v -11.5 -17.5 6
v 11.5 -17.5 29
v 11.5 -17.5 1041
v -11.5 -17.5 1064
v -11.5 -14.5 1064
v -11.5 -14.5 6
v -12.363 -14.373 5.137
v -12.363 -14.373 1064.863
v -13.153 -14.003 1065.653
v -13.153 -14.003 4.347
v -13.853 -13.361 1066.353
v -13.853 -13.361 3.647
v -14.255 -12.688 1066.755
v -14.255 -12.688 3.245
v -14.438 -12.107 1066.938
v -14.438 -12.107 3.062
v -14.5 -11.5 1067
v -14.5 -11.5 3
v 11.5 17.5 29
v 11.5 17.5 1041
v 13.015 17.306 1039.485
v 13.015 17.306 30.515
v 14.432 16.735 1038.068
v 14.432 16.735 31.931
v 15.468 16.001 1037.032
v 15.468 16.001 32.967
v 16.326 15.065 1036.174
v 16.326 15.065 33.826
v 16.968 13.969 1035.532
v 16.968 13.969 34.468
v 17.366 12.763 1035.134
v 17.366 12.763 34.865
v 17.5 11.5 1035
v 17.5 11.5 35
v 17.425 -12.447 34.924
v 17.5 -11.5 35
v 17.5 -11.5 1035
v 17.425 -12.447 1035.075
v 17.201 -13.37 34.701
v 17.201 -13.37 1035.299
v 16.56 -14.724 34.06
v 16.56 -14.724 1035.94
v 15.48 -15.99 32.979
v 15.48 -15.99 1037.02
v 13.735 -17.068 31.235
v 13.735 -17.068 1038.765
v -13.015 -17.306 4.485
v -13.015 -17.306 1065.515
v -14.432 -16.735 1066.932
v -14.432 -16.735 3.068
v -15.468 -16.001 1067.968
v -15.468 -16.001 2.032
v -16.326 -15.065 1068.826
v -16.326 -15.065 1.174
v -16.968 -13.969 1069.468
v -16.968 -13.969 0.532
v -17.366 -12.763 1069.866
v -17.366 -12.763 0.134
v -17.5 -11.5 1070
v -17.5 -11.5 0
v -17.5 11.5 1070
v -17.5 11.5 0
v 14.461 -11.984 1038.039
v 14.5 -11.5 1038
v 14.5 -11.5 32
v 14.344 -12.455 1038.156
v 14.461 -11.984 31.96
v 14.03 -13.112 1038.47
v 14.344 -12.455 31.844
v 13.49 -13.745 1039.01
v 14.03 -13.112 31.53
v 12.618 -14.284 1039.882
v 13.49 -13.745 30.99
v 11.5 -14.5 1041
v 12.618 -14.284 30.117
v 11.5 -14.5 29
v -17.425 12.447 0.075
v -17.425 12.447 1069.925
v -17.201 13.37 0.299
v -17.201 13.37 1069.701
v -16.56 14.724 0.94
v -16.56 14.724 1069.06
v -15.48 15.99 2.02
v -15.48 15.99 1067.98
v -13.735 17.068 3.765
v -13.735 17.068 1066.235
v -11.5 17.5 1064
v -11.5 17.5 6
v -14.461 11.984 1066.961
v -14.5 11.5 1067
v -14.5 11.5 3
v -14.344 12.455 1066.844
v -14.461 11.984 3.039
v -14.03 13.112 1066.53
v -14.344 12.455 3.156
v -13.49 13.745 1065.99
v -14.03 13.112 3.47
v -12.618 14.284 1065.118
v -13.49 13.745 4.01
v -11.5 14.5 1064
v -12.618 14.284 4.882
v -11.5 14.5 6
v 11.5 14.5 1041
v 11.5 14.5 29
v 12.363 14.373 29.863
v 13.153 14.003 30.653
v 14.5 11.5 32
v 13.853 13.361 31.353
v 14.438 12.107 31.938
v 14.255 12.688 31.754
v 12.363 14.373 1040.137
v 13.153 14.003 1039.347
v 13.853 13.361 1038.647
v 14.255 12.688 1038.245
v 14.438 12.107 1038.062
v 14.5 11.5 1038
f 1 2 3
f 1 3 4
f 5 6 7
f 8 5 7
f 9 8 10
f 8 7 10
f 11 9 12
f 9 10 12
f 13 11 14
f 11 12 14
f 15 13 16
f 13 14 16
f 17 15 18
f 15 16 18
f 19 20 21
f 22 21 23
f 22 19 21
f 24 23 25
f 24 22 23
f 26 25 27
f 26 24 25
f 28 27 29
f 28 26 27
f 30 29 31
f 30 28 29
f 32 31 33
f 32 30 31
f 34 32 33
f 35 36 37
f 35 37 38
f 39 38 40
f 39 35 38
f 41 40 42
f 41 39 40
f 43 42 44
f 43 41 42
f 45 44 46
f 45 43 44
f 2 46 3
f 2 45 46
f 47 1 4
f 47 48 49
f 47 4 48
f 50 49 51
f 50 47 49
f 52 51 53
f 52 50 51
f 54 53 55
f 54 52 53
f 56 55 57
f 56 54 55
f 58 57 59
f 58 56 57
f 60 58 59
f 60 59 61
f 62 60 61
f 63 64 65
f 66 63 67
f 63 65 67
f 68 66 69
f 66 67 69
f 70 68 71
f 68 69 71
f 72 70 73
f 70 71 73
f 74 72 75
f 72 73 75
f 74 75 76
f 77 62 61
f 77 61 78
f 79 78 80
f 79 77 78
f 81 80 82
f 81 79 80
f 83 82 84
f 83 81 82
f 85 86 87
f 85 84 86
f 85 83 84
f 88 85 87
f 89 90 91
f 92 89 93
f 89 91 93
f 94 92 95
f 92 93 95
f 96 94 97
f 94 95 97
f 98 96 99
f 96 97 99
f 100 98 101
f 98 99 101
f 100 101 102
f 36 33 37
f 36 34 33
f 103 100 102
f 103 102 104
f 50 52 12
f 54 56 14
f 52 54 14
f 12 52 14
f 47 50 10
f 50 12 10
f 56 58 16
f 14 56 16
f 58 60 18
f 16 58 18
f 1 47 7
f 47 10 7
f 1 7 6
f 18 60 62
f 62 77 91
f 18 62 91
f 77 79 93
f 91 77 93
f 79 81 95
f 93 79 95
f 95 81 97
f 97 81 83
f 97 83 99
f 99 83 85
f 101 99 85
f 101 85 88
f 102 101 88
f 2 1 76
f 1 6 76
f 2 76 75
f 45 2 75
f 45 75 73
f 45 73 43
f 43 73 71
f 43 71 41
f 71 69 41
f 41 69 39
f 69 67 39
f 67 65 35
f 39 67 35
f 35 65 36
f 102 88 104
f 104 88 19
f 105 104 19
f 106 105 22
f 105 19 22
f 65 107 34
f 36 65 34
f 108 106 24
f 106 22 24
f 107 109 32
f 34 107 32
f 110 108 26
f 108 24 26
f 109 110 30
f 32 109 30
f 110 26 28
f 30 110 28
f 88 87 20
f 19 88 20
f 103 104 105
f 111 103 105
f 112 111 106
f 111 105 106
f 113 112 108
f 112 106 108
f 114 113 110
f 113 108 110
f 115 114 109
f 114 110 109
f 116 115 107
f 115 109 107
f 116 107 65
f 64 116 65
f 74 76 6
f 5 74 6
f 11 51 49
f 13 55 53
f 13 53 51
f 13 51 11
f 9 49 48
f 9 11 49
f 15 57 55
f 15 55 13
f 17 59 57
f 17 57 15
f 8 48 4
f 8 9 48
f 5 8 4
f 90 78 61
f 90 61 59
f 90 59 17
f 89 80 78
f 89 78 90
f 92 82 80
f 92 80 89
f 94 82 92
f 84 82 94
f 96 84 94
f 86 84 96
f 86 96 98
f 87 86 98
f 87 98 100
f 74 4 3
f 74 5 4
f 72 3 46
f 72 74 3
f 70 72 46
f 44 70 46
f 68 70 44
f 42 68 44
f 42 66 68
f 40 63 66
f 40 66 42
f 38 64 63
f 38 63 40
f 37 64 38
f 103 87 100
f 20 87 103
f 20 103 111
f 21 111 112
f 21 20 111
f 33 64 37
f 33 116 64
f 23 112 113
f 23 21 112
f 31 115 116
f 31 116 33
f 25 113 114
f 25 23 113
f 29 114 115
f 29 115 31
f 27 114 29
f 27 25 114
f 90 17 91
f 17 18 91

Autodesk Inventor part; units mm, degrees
ref_plane "Počáteční rovina" through (0, 0, 0) normal (0, 0, 1) x (1, 0, 0)
ref_plane "Koncová rovina" through (0, 0, 1075) normal (0, 0, 1) x (1, 0, 0)
sketch "Náčrt1" plane through (0, 0, 0) normal (0, 0, 1) x (1, 0, 0)
  line L0 (-11.5, 17.5) -> (11.5, 17.5)
  line L1 (17.5, 11.5) -> (17.5, -11.5)
  line L2 (11.5, -17.5) -> (-11.5, -17.5)
  line L3 (-17.5, -11.5) -> (-17.5, 11.5)
  arc A0 (-11.5, 17.5) -> (-17.5, 11.5) centre (-11.5, 11.5) ccw
  arc A1 (17.5, 11.5) -> (11.5, 17.5) centre (11.5, 11.5) ccw
  arc A2 (11.5, -17.5) -> (17.5, -11.5) centre (11.5, -11.5) ccw
  arc A3 (-17.5, -11.5) -> (-11.5, -17.5) centre (-11.5, -11.5) ccw
  line L4 (-26.2397, 0) -> (26.2397, 0) construction
  line L5 (0, -26.2397) -> (0, 26.2397) construction
  arc A4 (-11.5, 14.5) -> (-14.5, 11.5) centre (-11.5, 11.5) ccw
  line L6 (-11.5, 14.5) -> (11.5, 14.5)
  arc A5 (14.5, 11.5) -> (11.5, 14.5) centre (11.5, 11.5) ccw
  line L7 (14.5, 11.5) -> (14.5, -11.5)
  arc A6 (11.5, -14.5) -> (14.5, -11.5) centre (11.5, -11.5) ccw
  line L8 (11.5, -14.5) -> (-11.5, -14.5)
  arc A7 (-14.5, -11.5) -> (-11.5, -14.5) centre (-11.5, -11.5) ccw
  line L9 (-14.5, -11.5) -> (-14.5, 11.5)
  point P0 (-17.5, 17.5)
  point P1 (17.5, -17.5)
  point P2 (17.5, 17.5)
  dimension "b" = 35
  dimension "msp_r" = 6
  dimension "d8" = 17.5
  dimension "d9" = 17.5
  dimension "d10" = 3
extrude "Těleso" add sketch "Náčrt1" along normal blind 1070
sketch "Sketch2" plane through (0, 0, 0) normal (0, 0, 1) x (1, 0, 0)
  line L0 (0, 0) -> (10, 0)
ref_plane "Work Plane3" through (0, 0, 0) normal (0, -1, 0) x (1, 0, 0)
sketch "Sketch3" plane through (0, 0, 0) normal (0, -1, 0) x (1, 0, 0)
  line L0 (-2, 0) -> (12, 0)
  line L1 (-2, 1075) -> (12, 1075)
  dimension "d14" = 1075
sketch "Náčrt4" plane through (11.5, 17.5, 1075) normal (0, 1, 0) x (1, 0, 0)
  line L0 (-23, 1075) -> (-29, 1075) projected
  line L1 (6, 1075) -> (6, 5) construction
  line L2 (-29, 1075) -> (6, 1075)
  line L3 (6, 1075) -> (6, 1040.0004)
  line L4 (-29, 1075) -> (6, 1040.0004)
  line L5 (-29, 1075) -> (-29, 5) construction
  line L6 (-23, 5) -> (-29, 5) projected
  line L7 (6, 5) -> (-29, 5)
  line L8 (-29, 5) -> (6, 40)
  line L9 (6, 40) -> (6, 5)
  point P0 (-11.5, 1075)
  dimension "d15" = 45
  dimension "d19" = 45
extrude "Vysunutí2" cut sketch "Náčrt4" against normal through all
ref_plane "Pracovní rovina4" through (517.5027, -11.5, 534.9973) normal (0, 0, 1) x (0, -1, 0)
equation "\"msp_r\" = 2 * ParT"
equation "\"d8\" = d9"
equation "\"d9\" = 0.5 * b"
equation "\"d10\" = ParT"
equation "\"G_OFFSET_START\" = 0"
equation "\"G_OFFSET_END\" = 0"
equation "\"d12\" = G_OFFSET_END + B_L"
equation "\"G_L\" = d14"
equation "\"B_L\" = 1075"
equation "\"ParT\" = 3"
properties part number "DD_KVD_003_03" material "Nerezová ocel"
